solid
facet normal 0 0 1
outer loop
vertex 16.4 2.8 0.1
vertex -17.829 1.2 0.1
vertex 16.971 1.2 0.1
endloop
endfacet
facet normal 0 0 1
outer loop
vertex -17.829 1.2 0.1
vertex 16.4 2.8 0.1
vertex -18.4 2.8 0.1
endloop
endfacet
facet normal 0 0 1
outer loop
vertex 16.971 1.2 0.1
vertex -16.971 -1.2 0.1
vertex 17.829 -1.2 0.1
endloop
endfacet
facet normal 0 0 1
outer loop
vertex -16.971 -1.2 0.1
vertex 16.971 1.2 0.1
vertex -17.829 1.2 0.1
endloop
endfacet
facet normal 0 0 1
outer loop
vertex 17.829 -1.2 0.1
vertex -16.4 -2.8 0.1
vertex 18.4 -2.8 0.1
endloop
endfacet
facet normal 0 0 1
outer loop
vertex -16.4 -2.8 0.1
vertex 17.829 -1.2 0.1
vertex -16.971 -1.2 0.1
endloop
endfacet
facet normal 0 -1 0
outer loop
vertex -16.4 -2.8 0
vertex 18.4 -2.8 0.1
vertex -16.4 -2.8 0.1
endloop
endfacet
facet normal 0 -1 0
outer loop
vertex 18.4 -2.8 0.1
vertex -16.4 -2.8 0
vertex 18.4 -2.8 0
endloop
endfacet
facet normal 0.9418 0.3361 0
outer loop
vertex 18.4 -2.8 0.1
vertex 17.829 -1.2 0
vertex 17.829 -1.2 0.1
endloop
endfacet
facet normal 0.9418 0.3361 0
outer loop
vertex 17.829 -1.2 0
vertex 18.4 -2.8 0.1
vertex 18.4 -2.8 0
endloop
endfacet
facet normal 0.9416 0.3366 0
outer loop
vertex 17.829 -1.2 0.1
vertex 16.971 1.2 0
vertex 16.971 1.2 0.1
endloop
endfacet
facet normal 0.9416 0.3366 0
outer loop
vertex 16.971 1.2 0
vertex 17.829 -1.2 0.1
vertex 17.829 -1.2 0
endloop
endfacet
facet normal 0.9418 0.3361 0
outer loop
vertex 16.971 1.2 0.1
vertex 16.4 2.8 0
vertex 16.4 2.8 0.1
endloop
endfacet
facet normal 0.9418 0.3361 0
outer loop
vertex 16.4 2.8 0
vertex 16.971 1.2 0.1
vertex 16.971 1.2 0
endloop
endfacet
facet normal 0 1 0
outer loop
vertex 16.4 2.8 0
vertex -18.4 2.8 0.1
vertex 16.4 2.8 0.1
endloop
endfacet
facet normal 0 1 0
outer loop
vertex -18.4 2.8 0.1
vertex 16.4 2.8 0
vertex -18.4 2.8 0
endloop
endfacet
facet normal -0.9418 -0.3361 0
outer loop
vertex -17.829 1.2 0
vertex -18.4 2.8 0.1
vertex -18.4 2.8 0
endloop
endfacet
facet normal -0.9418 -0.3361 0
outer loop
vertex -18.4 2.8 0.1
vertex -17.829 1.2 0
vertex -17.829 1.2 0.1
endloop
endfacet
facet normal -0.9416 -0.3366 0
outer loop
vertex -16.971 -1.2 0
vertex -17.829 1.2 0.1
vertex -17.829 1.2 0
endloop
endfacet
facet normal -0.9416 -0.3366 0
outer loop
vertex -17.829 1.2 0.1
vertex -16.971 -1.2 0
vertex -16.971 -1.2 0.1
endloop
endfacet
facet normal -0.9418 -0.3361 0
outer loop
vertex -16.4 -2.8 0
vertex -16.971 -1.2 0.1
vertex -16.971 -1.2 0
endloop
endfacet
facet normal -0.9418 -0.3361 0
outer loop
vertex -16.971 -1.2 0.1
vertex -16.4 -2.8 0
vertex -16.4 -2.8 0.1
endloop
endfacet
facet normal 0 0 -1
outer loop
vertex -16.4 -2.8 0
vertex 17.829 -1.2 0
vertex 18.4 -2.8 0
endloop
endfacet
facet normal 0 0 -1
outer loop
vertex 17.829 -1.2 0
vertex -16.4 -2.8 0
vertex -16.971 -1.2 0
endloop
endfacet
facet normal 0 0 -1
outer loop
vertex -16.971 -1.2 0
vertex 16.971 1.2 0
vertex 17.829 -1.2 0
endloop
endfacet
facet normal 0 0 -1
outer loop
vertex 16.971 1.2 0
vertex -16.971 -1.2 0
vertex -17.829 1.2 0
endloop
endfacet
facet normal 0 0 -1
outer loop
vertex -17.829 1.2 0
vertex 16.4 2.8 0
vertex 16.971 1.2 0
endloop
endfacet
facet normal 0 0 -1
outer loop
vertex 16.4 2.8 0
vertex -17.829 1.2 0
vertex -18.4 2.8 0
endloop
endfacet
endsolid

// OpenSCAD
// file: 6422772f.scad
use <../lib.scad>
function ldraw_lib__6422772f() = [
// 0 Sticker  0.7 x  4.6 with Right Sand Green and Black Windshield Pillar
// 0 Name: 6422772f.dat
// 0 Author: Florent Faramond [Makou]
// 0 !LDRAW_ORG Part UPDATE 2025-02
// 0 !LICENSE Licensed under CC BY 4.0 : see CAreadme.txt
// 
// 0 BFC CERTIFY CCW
  [0,"BFC","CERTIFY"],
  [0,"BFC","CCW"],
// 
// 0 !KEYWORDS Bricklink 10317stk01, Brickowl 529633, Defender 90, Land Rover
// 0 !KEYWORDS Rebrickable 10102115, Set 10317
// 
// 0 !HISTORY 2025-02-27 [OrionP] Official Update 2025-02
// 
// 
// 4 0 44.5714 -0.25 3 46 -0.25 7 -41 -0.25 7 -42.4286 -0.25 3
  [4,0,44.5714,-0.25,3,46,-0.25,7,-41,-0.25,7,-42.4286,-0.25,3],
// 4 378 -44.5714 -0.25 -3 42.4286 -0.25 -3 44.5714 -0.25 3 -42.4286 -0.25 3
  [4,378,-44.5714,-0.25,-3,42.4286,-0.25,-3,44.5714,-0.25,3,-42.4286,-0.25,3],
// 4 0 -44.5714 -0.25 -3 -46 -0.25 -7 41 -0.25 -7 42.4286 -0.25 -3
  [4,0,-44.5714,-0.25,-3,-46,-0.25,-7,41,-0.25,-7,42.4286,-0.25,-3],
// 4 16 -46 -0.25 -7 -46 0 -7 41 0 -7 41 -0.25 -7
  [4,16,-46,-0.25,-7,-46,0,-7,41,0,-7,41,-0.25,-7],
// 4 16 -46 -0.25 -7 -44.5714 -0.25 -3 -44.5714 0 -3 -46 0 -7
  [4,16,-46,-0.25,-7,-44.5714,-0.25,-3,-44.5714,0,-3,-46,0,-7],
// 4 16 -44.5714 -0.25 -3 -42.4286 -0.25 3 -42.4286 0 3 -44.5714 0 -3
  [4,16,-44.5714,-0.25,-3,-42.4286,-0.25,3,-42.4286,0,3,-44.5714,0,-3],
// 4 16 -42.4286 -0.25 3 -41 -0.25 7 -41 0 7 -42.4286 0 3
  [4,16,-42.4286,-0.25,3,-41,-0.25,7,-41,0,7,-42.4286,0,3],
// 4 16 -41 -0.25 7 46 -0.25 7 46 0 7 -41 0 7
  [4,16,-41,-0.25,7,46,-0.25,7,46,0,7,-41,0,7],
// 4 16 46 -0.25 7 44.5714 -0.25 3 44.5714 0 3 46 0 7
  [4,16,46,-0.25,7,44.5714,-0.25,3,44.5714,0,3,46,0,7],
// 4 16 44.5714 -0.25 3 42.4286 -0.25 -3 42.4286 0 -3 44.5714 0 3
  [4,16,44.5714,-0.25,3,42.4286,-0.25,-3,42.4286,0,-3,44.5714,0,3],
// 4 16 42.4286 -0.25 -3 41 -0.25 -7 41 0 -7 42.4286 0 -3
  [4,16,42.4286,-0.25,-3,41,-0.25,-7,41,0,-7,42.4286,0,-3],
// 4 16 41 0 -7 -46 0 -7 -44.5714 0 -3 42.4286 0 -3
  [4,16,41,0,-7,-46,0,-7,-44.5714,0,-3,42.4286,0,-3],
// 4 16 42.4286 0 -3 -44.5714 0 -3 -42.4286 0 3 44.5714 0 3
  [4,16,42.4286,0,-3,-44.5714,0,-3,-42.4286,0,3,44.5714,0,3],
// 4 16 44.5714 0 3 -42.4286 0 3 -41 0 7 46 0 7
  [4,16,44.5714,0,3,-42.4286,0,3,-41,0,7,46,0,7],
];
module ldraw_lib__6422772f(step=0, col=false, unit=2/5, alt=false, line=0.2, solid=!$preview)
    makepoly(ldraw_lib__6422772f(), step=step, col=col, unit=unit, alt=alt, line=line, solid=solid);
ldraw_lib__6422772f(line=0.2);
// main file
use <../lib.scad>
use <6422772f.scad>
function ldraw_lib__6422772i() = [
// 0 Sticker  0.7 x  4.6 with Left Sand Green and Black Windshield Pillar
// 0 Name: 6422772i.dat
// 0 Author: Florent Faramond [Makou]
// 0 !LDRAW_ORG Part UPDATE 2025-02
// 0 !LICENSE Licensed under CC BY 4.0 : see CAreadme.txt
// 
// 0 BFC CERTIFY CCW
  [0,"BFC","CERTIFY"],
  [0,"BFC","CCW"],
// 
// 0 !KEYWORDS Bricklink 10317stk01, Brickowl 529633, Defender 90, Land Rover
// 0 !KEYWORDS Rebrickable 10102115, Set 10317
// 
// 0 !HISTORY 2025-02-27 [OrionP] Official Update 2025-02
// 
// 
// 1 16 0 0 0 -1 0 0 0 1 0 0 0 1 6422772f.dat
  [1,16,0,0,0,-1,0,0,0,1,0,0,0,1, ldraw_lib__6422772f()],
];
module ldraw_lib__6422772i(step=0, col=false, unit=2/5, alt=false, line=0.2, solid=!$preview)
    makepoly(ldraw_lib__6422772i(), step=step, col=col, unit=unit, alt=alt, line=line, solid=solid);
ldraw_lib__6422772i(line=0.2);
